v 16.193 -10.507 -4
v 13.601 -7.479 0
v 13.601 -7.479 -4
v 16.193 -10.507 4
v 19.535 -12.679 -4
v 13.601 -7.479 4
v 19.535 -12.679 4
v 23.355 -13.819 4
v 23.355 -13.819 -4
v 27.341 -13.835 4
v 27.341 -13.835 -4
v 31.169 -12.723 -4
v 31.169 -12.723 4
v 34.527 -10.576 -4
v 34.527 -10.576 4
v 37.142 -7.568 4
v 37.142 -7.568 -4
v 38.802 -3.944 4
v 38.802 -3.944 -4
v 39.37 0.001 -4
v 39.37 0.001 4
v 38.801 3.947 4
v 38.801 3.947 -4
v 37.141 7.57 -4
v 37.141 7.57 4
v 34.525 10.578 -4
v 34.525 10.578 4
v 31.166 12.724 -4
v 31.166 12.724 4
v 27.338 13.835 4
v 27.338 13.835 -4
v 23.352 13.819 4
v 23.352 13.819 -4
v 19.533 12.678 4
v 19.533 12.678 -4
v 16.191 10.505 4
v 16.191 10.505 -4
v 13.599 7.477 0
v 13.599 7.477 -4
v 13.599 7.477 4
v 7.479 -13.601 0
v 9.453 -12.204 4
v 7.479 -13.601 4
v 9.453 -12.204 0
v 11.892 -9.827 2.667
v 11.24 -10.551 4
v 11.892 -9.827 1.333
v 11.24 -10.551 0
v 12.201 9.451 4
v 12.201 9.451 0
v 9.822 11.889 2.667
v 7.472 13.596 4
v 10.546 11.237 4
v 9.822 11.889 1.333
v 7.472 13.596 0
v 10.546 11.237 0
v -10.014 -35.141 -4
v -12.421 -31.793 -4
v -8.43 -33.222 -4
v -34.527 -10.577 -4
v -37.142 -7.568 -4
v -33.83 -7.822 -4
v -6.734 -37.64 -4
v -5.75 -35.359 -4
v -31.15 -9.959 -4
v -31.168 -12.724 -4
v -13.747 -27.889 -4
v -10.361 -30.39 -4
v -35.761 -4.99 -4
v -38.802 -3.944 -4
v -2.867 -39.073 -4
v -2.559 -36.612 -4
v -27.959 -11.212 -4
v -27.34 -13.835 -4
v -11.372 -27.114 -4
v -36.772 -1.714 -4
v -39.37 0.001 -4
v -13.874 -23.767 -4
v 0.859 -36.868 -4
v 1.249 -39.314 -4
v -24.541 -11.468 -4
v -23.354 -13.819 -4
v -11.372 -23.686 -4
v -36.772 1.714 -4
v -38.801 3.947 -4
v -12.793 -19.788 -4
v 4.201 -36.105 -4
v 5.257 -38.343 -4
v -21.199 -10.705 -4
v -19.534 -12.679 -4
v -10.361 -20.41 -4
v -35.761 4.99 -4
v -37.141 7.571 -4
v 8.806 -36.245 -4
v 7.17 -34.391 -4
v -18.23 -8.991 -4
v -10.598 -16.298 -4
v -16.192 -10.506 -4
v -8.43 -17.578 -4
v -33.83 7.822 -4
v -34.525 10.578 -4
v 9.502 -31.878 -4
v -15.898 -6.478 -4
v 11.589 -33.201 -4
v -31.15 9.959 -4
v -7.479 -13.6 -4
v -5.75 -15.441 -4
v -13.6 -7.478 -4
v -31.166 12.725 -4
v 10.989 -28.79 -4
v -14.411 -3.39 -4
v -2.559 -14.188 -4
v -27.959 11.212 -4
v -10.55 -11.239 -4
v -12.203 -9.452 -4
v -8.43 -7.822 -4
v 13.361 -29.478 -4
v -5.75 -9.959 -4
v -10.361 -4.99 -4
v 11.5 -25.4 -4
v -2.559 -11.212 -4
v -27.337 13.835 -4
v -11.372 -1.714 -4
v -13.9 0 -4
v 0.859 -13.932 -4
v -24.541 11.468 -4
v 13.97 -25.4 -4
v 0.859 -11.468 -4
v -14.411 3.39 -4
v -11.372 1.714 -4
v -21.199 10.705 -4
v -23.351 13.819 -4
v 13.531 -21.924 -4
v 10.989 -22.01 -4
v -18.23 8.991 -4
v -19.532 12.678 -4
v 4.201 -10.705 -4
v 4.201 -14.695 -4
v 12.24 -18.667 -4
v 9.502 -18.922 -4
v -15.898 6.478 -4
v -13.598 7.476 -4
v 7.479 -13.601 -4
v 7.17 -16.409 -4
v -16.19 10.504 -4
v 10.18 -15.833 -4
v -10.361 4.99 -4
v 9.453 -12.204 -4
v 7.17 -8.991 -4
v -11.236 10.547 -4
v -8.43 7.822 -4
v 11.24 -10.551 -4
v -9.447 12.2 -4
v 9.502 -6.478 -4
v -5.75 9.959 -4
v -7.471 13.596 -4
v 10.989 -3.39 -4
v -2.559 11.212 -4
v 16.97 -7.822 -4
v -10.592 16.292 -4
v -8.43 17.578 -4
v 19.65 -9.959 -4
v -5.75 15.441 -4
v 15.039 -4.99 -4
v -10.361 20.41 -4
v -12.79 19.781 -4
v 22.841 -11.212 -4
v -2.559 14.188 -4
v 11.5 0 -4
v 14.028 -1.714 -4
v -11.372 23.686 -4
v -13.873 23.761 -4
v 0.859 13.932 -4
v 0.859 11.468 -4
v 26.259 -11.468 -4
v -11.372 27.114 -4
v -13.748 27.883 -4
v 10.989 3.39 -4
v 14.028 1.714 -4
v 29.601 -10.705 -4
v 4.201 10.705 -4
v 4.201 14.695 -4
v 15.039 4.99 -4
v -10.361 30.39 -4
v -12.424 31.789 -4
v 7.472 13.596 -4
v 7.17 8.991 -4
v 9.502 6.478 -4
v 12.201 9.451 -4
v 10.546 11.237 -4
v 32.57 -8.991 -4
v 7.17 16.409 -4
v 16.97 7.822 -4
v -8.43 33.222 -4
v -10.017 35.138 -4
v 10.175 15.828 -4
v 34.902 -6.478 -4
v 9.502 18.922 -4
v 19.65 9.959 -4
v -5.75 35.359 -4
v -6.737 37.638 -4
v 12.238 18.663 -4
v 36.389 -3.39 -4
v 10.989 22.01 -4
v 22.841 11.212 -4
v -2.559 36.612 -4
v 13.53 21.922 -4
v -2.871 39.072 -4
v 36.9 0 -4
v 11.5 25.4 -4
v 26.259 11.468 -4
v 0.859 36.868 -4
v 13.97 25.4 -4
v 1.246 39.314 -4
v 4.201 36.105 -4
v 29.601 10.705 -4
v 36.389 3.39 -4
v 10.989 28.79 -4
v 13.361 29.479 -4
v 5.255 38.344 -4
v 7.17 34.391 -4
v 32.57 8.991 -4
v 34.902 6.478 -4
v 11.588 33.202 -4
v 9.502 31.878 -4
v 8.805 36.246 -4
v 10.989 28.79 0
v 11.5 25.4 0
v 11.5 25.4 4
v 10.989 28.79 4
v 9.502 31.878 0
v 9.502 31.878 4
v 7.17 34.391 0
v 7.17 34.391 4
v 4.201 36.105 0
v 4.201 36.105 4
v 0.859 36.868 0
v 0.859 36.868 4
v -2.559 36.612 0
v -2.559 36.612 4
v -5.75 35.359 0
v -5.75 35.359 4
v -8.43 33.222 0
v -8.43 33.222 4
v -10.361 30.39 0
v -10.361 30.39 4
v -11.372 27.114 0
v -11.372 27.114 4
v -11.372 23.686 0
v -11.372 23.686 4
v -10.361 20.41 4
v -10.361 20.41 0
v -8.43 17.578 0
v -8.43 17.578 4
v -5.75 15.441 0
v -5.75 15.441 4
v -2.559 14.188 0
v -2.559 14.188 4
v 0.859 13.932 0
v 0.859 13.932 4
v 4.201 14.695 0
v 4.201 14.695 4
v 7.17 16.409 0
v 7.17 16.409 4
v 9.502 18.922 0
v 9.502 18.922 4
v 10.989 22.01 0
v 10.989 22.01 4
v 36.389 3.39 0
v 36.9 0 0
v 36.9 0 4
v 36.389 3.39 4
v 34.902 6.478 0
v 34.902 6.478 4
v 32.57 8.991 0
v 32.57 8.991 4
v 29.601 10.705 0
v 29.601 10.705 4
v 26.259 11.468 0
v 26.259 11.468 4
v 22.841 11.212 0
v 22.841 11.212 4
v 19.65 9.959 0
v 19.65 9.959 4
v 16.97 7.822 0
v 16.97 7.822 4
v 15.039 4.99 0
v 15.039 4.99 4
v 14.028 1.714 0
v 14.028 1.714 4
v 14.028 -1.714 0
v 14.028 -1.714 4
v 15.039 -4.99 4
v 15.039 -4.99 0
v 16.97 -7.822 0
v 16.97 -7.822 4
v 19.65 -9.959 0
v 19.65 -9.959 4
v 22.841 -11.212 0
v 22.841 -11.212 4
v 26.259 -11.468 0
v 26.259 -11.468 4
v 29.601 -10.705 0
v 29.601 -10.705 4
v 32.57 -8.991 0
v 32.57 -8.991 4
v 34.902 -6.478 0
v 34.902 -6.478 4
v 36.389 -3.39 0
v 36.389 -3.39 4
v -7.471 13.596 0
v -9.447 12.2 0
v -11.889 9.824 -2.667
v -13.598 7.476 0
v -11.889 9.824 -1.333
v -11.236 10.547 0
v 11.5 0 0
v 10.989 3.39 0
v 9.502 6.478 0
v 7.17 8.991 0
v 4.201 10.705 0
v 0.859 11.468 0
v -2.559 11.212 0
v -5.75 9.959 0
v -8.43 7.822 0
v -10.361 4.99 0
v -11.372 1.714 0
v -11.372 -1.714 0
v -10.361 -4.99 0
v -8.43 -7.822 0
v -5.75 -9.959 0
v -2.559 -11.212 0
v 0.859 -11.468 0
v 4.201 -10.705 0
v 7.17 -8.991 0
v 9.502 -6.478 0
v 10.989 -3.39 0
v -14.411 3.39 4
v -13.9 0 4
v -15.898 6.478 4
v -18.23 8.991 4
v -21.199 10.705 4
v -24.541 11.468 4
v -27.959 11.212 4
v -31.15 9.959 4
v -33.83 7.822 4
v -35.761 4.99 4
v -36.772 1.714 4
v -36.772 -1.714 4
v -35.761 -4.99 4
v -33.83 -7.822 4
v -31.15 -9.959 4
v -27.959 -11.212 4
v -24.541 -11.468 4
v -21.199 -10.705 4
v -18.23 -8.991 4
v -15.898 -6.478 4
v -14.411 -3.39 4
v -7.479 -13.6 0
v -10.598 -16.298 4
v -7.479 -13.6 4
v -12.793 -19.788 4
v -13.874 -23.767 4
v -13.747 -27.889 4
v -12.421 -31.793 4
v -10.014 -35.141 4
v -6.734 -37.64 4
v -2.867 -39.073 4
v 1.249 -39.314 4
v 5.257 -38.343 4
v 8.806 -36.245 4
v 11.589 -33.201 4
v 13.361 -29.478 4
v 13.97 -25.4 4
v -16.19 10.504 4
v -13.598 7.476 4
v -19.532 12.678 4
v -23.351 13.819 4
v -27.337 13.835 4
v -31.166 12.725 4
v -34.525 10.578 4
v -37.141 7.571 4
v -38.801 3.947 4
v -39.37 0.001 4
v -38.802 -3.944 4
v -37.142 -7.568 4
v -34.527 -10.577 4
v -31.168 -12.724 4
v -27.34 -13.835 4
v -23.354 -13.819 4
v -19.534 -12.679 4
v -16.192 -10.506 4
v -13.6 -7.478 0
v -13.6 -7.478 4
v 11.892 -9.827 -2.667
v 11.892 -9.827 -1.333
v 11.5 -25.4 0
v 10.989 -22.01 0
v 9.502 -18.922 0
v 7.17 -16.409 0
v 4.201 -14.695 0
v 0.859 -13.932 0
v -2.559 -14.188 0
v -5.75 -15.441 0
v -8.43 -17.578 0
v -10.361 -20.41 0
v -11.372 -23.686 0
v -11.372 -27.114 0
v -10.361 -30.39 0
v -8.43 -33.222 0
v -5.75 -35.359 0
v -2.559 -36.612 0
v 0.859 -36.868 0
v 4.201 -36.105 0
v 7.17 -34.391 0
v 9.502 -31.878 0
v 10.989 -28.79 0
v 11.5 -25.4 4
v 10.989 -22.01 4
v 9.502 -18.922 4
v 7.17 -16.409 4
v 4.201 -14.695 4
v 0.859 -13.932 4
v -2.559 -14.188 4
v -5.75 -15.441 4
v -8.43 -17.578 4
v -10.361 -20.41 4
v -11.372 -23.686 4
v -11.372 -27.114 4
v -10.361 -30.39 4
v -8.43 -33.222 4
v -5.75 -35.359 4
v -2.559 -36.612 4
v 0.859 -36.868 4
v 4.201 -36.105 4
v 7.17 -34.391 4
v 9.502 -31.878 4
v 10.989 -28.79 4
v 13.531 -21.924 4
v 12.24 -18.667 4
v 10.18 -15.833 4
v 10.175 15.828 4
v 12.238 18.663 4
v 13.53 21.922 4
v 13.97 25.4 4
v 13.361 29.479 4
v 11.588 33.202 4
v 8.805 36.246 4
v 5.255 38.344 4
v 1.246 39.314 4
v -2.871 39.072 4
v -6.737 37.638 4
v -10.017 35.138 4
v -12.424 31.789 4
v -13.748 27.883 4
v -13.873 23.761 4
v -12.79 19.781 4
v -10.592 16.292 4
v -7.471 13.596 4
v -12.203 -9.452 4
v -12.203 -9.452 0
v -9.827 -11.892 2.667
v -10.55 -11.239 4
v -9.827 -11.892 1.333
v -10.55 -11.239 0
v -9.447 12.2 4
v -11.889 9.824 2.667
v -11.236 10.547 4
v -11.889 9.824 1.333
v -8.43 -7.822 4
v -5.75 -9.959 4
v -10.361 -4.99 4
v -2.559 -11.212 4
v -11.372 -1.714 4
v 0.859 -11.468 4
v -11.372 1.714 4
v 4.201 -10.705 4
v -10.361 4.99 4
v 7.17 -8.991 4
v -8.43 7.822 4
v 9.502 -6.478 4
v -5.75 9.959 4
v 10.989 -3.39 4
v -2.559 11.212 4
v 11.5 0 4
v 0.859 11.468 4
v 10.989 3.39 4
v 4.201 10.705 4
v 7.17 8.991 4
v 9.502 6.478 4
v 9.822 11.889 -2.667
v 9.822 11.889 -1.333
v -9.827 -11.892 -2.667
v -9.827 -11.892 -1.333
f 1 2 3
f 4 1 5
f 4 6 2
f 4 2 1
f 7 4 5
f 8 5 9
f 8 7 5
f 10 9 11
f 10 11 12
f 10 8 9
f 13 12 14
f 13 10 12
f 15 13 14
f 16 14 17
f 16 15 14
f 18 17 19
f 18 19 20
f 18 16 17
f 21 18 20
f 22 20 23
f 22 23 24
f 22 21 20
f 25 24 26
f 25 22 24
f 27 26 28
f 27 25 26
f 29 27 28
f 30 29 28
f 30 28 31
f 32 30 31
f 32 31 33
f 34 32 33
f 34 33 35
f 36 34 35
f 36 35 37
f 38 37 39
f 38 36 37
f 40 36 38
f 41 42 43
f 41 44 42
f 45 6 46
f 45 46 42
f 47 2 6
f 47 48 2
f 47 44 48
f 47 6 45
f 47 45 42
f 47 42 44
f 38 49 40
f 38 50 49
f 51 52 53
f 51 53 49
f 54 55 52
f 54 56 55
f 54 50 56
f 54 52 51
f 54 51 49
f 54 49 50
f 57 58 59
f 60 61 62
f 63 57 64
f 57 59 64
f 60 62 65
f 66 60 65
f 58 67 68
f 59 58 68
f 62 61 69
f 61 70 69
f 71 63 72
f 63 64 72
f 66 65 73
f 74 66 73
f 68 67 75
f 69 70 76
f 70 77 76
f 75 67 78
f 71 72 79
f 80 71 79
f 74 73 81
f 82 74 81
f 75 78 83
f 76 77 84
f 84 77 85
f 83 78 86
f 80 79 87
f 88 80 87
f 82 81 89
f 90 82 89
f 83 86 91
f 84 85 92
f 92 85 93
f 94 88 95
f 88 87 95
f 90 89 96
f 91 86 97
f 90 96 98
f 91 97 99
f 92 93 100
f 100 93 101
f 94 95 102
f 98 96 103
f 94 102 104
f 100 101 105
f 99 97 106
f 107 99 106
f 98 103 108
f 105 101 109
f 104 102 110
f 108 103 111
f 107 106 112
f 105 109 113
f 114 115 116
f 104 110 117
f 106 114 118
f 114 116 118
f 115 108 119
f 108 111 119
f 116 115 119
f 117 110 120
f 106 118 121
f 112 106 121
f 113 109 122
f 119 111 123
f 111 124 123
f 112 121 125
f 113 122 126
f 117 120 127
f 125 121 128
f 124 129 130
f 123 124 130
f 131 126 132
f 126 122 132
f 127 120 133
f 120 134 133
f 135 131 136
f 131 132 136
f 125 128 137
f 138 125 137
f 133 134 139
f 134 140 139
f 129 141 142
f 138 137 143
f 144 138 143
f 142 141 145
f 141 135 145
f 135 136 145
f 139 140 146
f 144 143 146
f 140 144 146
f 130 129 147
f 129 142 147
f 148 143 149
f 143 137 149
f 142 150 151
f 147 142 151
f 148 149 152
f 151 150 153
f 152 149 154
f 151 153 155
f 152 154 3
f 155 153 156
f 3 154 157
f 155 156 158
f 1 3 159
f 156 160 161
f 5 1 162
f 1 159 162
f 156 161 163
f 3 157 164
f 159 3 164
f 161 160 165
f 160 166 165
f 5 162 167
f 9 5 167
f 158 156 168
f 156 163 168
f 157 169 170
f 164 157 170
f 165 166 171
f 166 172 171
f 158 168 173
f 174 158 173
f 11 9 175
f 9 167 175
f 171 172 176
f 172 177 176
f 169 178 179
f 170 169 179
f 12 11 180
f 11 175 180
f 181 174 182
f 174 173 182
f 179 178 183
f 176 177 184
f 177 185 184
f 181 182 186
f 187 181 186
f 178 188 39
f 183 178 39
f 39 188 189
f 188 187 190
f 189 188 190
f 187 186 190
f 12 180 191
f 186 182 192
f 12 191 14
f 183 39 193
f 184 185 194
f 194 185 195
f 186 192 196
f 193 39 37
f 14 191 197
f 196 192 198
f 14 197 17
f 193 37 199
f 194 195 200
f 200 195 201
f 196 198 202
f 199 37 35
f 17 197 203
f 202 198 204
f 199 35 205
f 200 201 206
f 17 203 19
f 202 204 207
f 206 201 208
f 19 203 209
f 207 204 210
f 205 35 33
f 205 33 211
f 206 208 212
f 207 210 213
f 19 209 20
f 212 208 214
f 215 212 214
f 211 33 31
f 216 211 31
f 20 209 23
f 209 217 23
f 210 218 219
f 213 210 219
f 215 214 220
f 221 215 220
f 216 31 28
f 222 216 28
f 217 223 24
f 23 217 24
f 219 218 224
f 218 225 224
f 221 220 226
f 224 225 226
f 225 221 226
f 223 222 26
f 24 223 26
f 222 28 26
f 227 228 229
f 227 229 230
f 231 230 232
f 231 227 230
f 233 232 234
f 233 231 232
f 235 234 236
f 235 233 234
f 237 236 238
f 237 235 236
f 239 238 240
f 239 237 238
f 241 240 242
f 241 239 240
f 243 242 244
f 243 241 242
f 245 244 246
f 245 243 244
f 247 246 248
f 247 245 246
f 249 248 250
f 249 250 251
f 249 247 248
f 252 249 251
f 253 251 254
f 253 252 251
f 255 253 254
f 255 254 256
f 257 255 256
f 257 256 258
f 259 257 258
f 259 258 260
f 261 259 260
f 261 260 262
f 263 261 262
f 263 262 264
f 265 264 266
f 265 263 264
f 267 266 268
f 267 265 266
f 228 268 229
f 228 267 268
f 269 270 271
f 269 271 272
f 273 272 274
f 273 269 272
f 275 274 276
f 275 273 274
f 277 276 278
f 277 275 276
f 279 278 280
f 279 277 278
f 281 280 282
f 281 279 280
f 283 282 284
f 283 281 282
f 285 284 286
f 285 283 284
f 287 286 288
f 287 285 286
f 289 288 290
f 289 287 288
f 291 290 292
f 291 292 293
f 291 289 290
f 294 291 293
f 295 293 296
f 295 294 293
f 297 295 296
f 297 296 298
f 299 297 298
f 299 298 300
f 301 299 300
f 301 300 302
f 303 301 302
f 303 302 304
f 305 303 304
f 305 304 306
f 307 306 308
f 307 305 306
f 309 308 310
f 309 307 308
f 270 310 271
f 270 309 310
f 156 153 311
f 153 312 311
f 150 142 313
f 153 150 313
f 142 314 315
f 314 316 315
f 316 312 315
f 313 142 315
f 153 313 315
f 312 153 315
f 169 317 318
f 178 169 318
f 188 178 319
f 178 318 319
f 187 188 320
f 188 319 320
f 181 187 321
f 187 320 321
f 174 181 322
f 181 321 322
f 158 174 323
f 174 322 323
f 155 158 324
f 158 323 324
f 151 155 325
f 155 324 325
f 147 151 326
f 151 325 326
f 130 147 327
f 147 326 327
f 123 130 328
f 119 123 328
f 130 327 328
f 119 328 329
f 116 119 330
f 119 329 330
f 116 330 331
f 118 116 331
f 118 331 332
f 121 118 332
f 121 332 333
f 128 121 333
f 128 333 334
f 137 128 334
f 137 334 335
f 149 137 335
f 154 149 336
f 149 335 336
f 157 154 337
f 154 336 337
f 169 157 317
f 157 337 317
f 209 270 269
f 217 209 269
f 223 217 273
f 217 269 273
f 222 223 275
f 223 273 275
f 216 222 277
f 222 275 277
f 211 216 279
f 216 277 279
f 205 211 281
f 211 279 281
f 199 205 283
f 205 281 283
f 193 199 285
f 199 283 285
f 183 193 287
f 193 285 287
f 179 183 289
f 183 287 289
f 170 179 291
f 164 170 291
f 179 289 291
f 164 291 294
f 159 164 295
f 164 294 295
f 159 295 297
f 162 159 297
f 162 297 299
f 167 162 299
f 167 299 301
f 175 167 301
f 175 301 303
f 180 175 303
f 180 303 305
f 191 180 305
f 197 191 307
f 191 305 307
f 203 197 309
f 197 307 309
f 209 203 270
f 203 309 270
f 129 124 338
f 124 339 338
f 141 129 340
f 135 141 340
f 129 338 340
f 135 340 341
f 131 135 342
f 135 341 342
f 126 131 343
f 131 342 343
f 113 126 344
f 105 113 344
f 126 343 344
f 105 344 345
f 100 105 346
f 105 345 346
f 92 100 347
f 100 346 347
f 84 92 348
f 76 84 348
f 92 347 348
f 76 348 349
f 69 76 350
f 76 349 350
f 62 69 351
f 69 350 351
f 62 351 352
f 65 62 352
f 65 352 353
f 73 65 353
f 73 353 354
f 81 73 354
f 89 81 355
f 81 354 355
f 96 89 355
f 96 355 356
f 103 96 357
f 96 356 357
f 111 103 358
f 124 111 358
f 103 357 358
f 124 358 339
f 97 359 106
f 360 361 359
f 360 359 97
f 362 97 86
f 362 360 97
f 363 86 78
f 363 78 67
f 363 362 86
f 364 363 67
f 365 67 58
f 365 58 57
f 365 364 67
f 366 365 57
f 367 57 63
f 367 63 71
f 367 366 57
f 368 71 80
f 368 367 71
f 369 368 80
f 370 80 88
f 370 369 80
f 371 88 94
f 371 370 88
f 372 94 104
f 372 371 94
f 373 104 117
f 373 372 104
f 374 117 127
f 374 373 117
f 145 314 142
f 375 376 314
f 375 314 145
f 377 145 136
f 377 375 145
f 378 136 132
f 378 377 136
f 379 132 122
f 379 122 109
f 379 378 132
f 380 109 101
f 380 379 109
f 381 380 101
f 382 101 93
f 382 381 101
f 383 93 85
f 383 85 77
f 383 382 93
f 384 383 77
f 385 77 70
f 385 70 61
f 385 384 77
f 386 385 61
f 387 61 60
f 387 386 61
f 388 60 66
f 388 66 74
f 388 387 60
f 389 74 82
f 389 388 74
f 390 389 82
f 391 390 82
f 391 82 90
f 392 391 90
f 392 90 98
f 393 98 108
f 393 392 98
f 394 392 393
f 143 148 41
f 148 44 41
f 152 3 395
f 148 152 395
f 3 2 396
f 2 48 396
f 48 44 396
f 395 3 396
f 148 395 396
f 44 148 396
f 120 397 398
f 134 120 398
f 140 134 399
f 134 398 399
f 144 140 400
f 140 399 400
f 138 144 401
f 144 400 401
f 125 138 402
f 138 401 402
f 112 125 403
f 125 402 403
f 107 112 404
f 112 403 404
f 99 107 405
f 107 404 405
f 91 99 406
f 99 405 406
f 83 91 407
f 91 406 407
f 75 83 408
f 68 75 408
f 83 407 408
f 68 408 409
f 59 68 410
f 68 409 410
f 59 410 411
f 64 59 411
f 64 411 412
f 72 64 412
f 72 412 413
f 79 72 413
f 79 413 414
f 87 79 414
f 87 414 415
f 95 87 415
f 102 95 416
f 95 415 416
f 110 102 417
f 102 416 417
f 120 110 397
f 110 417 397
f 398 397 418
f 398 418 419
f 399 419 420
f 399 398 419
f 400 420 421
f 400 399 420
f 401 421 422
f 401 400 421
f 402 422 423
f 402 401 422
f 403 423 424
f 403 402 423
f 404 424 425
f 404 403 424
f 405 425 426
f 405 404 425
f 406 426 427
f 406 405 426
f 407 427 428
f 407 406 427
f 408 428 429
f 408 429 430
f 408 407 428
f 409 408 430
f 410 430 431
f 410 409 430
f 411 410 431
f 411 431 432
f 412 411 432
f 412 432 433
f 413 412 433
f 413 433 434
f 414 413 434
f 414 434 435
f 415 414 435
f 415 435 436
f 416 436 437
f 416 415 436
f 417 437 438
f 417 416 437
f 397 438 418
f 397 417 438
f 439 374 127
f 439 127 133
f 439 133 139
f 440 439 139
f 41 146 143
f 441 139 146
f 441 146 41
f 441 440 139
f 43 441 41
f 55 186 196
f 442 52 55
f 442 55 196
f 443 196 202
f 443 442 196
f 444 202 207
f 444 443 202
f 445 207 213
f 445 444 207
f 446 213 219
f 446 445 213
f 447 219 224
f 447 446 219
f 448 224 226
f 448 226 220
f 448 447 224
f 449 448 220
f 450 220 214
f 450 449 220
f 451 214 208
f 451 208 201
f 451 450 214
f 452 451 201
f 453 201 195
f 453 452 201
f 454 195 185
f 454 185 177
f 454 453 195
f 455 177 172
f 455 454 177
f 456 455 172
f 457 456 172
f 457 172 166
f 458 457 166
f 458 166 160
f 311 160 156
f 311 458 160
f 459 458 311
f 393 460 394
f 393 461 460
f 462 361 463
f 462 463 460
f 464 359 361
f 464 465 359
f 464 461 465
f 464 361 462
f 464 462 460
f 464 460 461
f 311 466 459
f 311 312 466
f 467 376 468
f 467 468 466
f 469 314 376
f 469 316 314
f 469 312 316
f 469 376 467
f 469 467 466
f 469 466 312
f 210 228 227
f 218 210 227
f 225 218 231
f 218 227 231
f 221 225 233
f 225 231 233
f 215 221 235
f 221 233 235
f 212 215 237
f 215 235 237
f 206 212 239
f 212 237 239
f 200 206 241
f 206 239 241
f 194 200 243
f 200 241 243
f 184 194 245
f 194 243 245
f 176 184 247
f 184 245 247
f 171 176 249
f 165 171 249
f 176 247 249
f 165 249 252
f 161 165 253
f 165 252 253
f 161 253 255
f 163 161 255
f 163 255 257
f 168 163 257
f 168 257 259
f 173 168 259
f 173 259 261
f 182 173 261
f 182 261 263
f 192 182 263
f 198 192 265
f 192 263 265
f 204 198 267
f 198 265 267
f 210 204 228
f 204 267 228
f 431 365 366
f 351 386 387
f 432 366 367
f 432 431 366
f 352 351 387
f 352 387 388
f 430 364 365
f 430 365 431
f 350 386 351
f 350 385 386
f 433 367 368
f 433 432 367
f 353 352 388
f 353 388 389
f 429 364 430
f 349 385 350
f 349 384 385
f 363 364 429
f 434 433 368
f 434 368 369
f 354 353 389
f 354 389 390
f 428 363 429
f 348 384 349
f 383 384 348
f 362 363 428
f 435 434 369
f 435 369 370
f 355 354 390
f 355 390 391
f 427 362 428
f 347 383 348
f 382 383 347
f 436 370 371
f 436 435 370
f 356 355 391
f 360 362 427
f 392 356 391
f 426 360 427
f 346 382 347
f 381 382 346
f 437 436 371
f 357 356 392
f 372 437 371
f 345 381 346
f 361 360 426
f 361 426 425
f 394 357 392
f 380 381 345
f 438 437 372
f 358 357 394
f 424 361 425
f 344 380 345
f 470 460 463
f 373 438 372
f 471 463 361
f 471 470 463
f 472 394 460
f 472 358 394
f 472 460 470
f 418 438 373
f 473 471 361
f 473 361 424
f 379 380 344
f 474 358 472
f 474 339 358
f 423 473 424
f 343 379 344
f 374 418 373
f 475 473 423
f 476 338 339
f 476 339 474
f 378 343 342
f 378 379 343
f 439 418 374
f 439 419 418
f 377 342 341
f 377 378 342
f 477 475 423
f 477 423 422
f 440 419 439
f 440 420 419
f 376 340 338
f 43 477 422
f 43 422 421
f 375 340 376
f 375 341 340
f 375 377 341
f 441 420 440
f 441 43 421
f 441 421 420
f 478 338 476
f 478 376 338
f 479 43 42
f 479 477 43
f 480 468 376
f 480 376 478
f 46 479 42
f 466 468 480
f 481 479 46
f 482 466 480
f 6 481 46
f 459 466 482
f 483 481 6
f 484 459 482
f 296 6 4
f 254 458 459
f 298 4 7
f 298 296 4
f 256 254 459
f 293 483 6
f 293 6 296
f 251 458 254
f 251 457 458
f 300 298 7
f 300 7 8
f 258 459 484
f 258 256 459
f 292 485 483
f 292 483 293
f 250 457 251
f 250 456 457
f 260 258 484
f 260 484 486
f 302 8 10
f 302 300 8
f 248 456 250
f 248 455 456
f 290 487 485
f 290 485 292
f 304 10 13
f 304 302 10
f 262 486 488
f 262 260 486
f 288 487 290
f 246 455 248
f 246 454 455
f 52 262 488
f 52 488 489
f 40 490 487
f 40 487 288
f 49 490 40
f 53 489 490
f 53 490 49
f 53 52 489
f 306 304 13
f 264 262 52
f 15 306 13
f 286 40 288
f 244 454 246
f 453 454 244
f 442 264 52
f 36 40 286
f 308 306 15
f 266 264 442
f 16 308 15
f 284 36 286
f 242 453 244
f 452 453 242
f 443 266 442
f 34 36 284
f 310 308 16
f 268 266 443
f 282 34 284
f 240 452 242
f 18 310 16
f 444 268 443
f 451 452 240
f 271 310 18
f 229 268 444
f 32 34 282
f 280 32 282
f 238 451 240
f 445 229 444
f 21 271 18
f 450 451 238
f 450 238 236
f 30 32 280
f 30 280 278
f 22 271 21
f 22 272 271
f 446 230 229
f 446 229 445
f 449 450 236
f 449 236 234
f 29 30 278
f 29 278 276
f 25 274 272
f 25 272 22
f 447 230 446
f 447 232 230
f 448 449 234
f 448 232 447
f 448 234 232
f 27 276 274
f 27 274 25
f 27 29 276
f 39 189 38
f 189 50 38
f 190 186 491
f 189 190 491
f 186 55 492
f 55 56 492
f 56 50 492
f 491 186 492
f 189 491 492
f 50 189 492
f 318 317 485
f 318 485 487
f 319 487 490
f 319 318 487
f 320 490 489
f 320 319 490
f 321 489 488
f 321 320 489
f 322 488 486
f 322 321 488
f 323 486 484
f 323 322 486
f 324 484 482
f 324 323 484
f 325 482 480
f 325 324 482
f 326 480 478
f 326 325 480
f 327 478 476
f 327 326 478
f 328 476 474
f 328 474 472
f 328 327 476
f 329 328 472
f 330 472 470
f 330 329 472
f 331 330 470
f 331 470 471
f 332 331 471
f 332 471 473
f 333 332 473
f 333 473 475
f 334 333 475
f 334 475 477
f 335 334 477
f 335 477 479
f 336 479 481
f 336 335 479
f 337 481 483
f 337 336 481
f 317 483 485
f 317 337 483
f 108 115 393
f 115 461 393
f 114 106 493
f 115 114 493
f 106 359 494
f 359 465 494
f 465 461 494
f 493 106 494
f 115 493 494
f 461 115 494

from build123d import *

# Parameters (mm, degrees)
F2_DEPTH = 4
F0_R     = 11.5
F3_DEPTH = 4


with BuildPart() as f2:
    # F1 (on Top) → F2 (new body, symmetric)
    with BuildSketch(Plane.XY):
        with BuildLine():
            ThreePointArc((-13.5999908393, -7.4780133596), (-11.983461177, -3.8932487735), (-11.43, 0))
            ThreePointArc((-11.43, 0), (-11.9830626174, 3.891875033), (-13.5984597383, 7.4755967957))
            add(Edge.make_bspline(
                [(-15.8525407314, 0), (-15.8522471897, 2.5837824299), (-15.0093024718, 5.1671341097), (-13.5984597383, 7.4755967957)],
                knots=[0, 0, 0, 0, 0.0815141474, 0.0815141474, 0.0815141474, 0.0815141474], degree=3))
            add(Edge.make_bspline(
                [(-13.5999908393, -7.4780133596), (-15.0104036313, -5.1682195796), (-15.8528342859, -2.583894396), (-15.8525407314, 0)],
                knots=[0.9184823203, 0.9184823203, 0.9184823203, 0.9184823203, 1, 1, 1, 1], degree=3))
        make_face()
        with BuildLine():
            ThreePointArc((-13.5984597383, 7.4755967957), (-11.9830626174, 3.891875033), (-11.43, 0))
            ThreePointArc((-11.43, 0), (-11.983461177, -3.8932487735), (-13.5999908393, -7.4780133596))
            add(Edge.make_bspline(
                [(-7.4785417751, -13.6003257283), (-9.9432134858, -12.0948774028), (-12.0949702136, -9.9427437558), (-13.5999908393, -7.4780133596)],
                knots=[0.8314965882, 0.8314965882, 0.8314965882, 0.8314965882, 0.9184823203, 0.9184823203, 0.9184823203, 0.9184823203], degree=3))
            ThreePointArc((-7.4785417751, -13.6003257283), (0.0002714697, -11.4300000026), (7.4790003598, -13.6006163882))
            add(Edge.make_bspline(
                [(13.6008490507, -7.4793674115), (12.0955450693, -9.9436905864), (9.9436552045, -12.0954300948), (7.4790003598, -13.6006163882)],
                knots=[0.5814918981, 0.5814918981, 0.5814918981, 0.5814918981, 0.6684682369, 0.6684682369, 0.6684682369, 0.6684682369], degree=3))
            ThreePointArc((13.6008490507, -7.4793674115), (11.4300000733, -0.0014306429), (13.5993174007, 7.4769505944))
            add(Edge.make_bspline(
                [(7.4718602429, 13.5960936758), (9.9386630737, 12.0924010227), (12.0926316746, 9.941363048), (13.5993174007, 7.4769505944)],
                knots=[0.3314005666, 0.3314005666, 0.3314005666, 0.3314005666, 0.4184264481, 0.4184264481, 0.4184264481, 0.4184264481], degree=3))
            ThreePointArc((7.4718602429, 13.5960936758), (0.0002712159, 11.4300000026), (-7.4714019113, 13.5958035648))
            add(Edge.make_bspline(
                [(-13.5984597383, 7.4755967957), (-12.0920574929, 9.9404167869), (-9.9382219246, 12.0918490046), (-7.4714019113, 13.5958035648)],
                knots=[0.0815141474, 0.0815141474, 0.0815141474, 0.0815141474, 0.168549429, 0.168549429, 0.168549429, 0.168549429], degree=3))
        make_face()
        with BuildLine():
            add(Edge.make_bspline(
                [(-15.8525407314, 0), (-15.8522471897, 2.5837824299), (-15.0093024718, 5.1671341097), (-13.5984597383, 7.4755967957)],
                knots=[0, 0, 0, 0, 0.0815141474, 0.0815141474, 0.0815141474, 0.0815141474], degree=3))
            ThreePointArc((-13.5984597383, 7.4755967957), (-39.3699999268, 0.001430389), (-13.5999908393, -7.4780133596))
            add(Edge.make_bspline(
                [(-13.5999908393, -7.4780133596), (-15.0104036313, -5.1682195796), (-15.8528342859, -2.583894396), (-15.8525407314, 0)],
                knots=[0.9184823203, 0.9184823203, 0.9184823203, 0.9184823203, 1, 1, 1, 1], degree=3))
        make_face()
        with BuildLine():
            add(Edge.make_bspline(
                [(-7.4714019113, 13.5958035648), (-5.1635862062, 15.0028174269), (-6.01624e-05, 16.6834550003), (5.1637921907, 15.0030261348), (7.4718602429, 13.5960936758)],
                knots=[0.168549429, 0.168549429, 0.168549429, 0.168549429, 0.2499746601, 0.3314005666, 0.3314005666, 0.3314005666, 0.3314005666], degree=3))
            ThreePointArc((-7.4714019113, 13.5958035648), (0.0002712159, 11.4300000026), (7.4718602429, 13.5960936758))
        make_face()
        with BuildLine():
            ThreePointArc((13.97, 25.4), (-6.7374110495, 37.6379815472), (-7.4714019113, 13.5958035648))
            add(Edge.make_bspline(
                [(-7.4714019113, 13.5958035648), (-5.1635862062, 15.0028174269), (-6.01624e-05, 16.6834550003), (5.1637921907, 15.0030261348), (7.4718602429, 13.5960936758)],
                knots=[0.168549429, 0.168549429, 0.168549429, 0.168549429, 0.2499746601, 0.3314005666, 0.3314005666, 0.3314005666, 0.3314005666], degree=3))
            ThreePointArc((7.4718602429, 13.5960936758), (12.2381123461, 18.662826542), (13.97, 25.4))
        make_face()
        with BuildLine():
            add(Edge.make_bspline(
                [(7.4790003598, -13.6006163882), (5.169117738, -15.0112819299), (-6.05056e-05, -16.6968060532), (-5.1689117665, -15.0110728934), (-7.4785417751, -13.6003257283)],
                knots=[0.6684682369, 0.6684682369, 0.6684682369, 0.6684682369, 0.7499827475, 0.8314965882, 0.8314965882, 0.8314965882, 0.8314965882], degree=3))
            ThreePointArc((-7.4785417751, -13.6003257283), (-6.7337089112, -37.6400189664), (13.97, -25.4))
            ThreePointArc((13.97, -25.4), (12.2401498158, -18.6665289421), (7.4790003598, -13.6006163882))
        make_face()
        with BuildLine():
            ThreePointArc((7.4790003598, -13.6006163882), (0.0002714697, -11.4300000026), (-7.4785417751, -13.6003257283))
            add(Edge.make_bspline(
                [(7.4790003598, -13.6006163882), (5.169117738, -15.0112819299), (-6.05056e-05, -16.6968060532), (-5.1689117665, -15.0110728934), (-7.4785417751, -13.6003257283)],
                knots=[0.6684682369, 0.6684682369, 0.6684682369, 0.6684682369, 0.7499827475, 0.8314965882, 0.8314965882, 0.8314965882, 0.8314965882], degree=3))
        make_face()
        with BuildLine():
            add(Edge.make_bspline(
                [(13.5993174007, 7.4769505944), (15.010869159, 5.1681441381), (16.697763129, 0.000319146), (15.0119706471, -5.1692295952), (13.6008490507, -7.4793674115)],
                knots=[0.4184264481, 0.4184264481, 0.4184264481, 0.4184264481, 0.4999574097, 0.5814918981, 0.5814918981, 0.5814918981, 0.5814918981], degree=3))
            ThreePointArc((13.5993174007, 7.4769505944), (11.4300000733, -0.0014306429), (13.6008490507, -7.4793674115))
        make_face()
        with BuildLine():
            ThreePointArc((39.37, 0), (29.292644608, 13.4167141266), (13.5993174007, 7.4769505944))
            add(Edge.make_bspline(
                [(13.5993174007, 7.4769505944), (15.010869159, 5.1681441381), (16.697763129, 0.000319146), (15.0119706471, -5.1692295952), (13.6008490507, -7.4793674115)],
                knots=[0.4184264481, 0.4184264481, 0.4184264481, 0.4184264481, 0.4999574097, 0.5814918981, 0.5814918981, 0.5814918981, 0.5814918981], degree=3))
            ThreePointArc((13.6008490507, -7.4793674115), (29.2940185695, -13.4163154175), (39.37, 0))
        make_face()
    extrude(amount=F2_DEPTH, both=True)

    # F0 (on Top) → F3 (cut, symmetric)
    with BuildSketch(Plane.XY):
        Circle(F0_R)
        with Locations((0, -25.4)):
            Circle(F0_R)
        with Locations((25.4, 0)):
            Circle(F0_R)
        with Locations((0, 25.4)):
            Circle(F0_R)
        with Locations((-25.4, 0)):
            Circle(F0_R)
    extrude(amount=F3_DEPTH, both=True, mode=Mode.SUBTRACT)


solid = f2.part
